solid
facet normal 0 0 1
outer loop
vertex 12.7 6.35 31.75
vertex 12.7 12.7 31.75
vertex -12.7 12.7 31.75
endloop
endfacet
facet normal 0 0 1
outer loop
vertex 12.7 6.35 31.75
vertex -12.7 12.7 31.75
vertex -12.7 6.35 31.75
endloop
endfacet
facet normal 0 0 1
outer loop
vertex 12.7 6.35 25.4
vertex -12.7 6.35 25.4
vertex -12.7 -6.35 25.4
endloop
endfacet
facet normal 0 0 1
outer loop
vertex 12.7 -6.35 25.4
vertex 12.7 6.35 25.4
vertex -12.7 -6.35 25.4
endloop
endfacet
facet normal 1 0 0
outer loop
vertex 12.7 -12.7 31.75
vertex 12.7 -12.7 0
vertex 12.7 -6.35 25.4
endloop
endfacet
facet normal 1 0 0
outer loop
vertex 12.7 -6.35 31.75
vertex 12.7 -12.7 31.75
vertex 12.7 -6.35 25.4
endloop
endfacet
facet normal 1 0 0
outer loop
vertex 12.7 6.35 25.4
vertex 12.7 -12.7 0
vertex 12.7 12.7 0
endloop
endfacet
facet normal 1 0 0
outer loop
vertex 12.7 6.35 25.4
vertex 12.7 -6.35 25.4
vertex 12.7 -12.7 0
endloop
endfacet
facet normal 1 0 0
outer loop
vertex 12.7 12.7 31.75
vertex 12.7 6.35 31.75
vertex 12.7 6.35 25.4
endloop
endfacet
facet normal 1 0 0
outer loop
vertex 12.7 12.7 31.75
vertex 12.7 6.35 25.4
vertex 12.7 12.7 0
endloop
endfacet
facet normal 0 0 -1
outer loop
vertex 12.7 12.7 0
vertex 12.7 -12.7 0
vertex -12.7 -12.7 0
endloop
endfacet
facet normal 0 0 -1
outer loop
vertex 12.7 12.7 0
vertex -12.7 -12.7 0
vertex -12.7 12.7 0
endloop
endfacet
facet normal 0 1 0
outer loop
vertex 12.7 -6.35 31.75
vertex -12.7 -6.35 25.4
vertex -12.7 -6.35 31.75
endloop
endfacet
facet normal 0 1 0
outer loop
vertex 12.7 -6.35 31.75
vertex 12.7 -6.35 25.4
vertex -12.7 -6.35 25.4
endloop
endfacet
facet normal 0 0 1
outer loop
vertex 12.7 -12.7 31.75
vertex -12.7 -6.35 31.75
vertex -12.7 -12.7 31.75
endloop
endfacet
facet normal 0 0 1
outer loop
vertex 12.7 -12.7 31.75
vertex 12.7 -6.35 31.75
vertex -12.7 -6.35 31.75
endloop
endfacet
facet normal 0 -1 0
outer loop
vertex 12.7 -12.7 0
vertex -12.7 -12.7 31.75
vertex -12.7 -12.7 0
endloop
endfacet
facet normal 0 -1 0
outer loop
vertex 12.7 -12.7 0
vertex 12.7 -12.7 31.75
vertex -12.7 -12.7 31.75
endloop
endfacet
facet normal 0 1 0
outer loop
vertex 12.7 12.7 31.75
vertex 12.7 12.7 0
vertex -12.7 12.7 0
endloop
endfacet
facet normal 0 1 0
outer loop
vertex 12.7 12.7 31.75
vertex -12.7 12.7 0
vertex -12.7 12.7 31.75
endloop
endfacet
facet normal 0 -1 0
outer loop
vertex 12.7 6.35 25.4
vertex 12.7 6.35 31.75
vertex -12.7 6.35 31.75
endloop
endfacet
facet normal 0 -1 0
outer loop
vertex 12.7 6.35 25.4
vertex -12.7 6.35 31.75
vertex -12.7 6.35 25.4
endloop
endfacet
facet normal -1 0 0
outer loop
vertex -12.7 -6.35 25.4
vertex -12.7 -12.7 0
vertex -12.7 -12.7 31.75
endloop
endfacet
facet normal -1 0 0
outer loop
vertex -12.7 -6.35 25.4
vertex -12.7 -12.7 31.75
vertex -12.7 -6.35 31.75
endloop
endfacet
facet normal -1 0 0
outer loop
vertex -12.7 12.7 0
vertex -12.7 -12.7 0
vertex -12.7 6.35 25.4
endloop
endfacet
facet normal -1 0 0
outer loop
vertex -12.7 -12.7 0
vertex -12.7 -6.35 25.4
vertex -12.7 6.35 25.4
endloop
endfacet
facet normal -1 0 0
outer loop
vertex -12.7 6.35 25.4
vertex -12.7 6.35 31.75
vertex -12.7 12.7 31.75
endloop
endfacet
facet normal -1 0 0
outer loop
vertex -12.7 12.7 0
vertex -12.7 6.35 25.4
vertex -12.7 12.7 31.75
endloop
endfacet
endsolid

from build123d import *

# Parameters (mm, degrees)
F2_DEPTH = 12.7
F3_DEPTH = 12.7


with BuildPart() as f2:
    # F0 (on Right) → F2 (new body)
    with BuildSketch(Plane.YZ):
        Polygon((-12.7, 31.75), (-12.7, 0), (12.7, 0), (12.7, 31.75), (6.35, 31.75), (6.35, 25.4), (-6.35, 25.4), (-6.35, 31.75), align=None)
    extrude(amount=F2_DEPTH)

    # F1 (on Right) → F3 (join)
    with BuildSketch(Plane.YZ):
        Polygon((-12.7, 31.75), (-12.7, 0), (12.7, 0), (12.7, 31.75), (6.35, 31.75), (6.35, 25.4), (-6.35, 25.4), (-6.35, 31.75), align=None)
    extrude(amount=-F3_DEPTH)


solid = f2.part
